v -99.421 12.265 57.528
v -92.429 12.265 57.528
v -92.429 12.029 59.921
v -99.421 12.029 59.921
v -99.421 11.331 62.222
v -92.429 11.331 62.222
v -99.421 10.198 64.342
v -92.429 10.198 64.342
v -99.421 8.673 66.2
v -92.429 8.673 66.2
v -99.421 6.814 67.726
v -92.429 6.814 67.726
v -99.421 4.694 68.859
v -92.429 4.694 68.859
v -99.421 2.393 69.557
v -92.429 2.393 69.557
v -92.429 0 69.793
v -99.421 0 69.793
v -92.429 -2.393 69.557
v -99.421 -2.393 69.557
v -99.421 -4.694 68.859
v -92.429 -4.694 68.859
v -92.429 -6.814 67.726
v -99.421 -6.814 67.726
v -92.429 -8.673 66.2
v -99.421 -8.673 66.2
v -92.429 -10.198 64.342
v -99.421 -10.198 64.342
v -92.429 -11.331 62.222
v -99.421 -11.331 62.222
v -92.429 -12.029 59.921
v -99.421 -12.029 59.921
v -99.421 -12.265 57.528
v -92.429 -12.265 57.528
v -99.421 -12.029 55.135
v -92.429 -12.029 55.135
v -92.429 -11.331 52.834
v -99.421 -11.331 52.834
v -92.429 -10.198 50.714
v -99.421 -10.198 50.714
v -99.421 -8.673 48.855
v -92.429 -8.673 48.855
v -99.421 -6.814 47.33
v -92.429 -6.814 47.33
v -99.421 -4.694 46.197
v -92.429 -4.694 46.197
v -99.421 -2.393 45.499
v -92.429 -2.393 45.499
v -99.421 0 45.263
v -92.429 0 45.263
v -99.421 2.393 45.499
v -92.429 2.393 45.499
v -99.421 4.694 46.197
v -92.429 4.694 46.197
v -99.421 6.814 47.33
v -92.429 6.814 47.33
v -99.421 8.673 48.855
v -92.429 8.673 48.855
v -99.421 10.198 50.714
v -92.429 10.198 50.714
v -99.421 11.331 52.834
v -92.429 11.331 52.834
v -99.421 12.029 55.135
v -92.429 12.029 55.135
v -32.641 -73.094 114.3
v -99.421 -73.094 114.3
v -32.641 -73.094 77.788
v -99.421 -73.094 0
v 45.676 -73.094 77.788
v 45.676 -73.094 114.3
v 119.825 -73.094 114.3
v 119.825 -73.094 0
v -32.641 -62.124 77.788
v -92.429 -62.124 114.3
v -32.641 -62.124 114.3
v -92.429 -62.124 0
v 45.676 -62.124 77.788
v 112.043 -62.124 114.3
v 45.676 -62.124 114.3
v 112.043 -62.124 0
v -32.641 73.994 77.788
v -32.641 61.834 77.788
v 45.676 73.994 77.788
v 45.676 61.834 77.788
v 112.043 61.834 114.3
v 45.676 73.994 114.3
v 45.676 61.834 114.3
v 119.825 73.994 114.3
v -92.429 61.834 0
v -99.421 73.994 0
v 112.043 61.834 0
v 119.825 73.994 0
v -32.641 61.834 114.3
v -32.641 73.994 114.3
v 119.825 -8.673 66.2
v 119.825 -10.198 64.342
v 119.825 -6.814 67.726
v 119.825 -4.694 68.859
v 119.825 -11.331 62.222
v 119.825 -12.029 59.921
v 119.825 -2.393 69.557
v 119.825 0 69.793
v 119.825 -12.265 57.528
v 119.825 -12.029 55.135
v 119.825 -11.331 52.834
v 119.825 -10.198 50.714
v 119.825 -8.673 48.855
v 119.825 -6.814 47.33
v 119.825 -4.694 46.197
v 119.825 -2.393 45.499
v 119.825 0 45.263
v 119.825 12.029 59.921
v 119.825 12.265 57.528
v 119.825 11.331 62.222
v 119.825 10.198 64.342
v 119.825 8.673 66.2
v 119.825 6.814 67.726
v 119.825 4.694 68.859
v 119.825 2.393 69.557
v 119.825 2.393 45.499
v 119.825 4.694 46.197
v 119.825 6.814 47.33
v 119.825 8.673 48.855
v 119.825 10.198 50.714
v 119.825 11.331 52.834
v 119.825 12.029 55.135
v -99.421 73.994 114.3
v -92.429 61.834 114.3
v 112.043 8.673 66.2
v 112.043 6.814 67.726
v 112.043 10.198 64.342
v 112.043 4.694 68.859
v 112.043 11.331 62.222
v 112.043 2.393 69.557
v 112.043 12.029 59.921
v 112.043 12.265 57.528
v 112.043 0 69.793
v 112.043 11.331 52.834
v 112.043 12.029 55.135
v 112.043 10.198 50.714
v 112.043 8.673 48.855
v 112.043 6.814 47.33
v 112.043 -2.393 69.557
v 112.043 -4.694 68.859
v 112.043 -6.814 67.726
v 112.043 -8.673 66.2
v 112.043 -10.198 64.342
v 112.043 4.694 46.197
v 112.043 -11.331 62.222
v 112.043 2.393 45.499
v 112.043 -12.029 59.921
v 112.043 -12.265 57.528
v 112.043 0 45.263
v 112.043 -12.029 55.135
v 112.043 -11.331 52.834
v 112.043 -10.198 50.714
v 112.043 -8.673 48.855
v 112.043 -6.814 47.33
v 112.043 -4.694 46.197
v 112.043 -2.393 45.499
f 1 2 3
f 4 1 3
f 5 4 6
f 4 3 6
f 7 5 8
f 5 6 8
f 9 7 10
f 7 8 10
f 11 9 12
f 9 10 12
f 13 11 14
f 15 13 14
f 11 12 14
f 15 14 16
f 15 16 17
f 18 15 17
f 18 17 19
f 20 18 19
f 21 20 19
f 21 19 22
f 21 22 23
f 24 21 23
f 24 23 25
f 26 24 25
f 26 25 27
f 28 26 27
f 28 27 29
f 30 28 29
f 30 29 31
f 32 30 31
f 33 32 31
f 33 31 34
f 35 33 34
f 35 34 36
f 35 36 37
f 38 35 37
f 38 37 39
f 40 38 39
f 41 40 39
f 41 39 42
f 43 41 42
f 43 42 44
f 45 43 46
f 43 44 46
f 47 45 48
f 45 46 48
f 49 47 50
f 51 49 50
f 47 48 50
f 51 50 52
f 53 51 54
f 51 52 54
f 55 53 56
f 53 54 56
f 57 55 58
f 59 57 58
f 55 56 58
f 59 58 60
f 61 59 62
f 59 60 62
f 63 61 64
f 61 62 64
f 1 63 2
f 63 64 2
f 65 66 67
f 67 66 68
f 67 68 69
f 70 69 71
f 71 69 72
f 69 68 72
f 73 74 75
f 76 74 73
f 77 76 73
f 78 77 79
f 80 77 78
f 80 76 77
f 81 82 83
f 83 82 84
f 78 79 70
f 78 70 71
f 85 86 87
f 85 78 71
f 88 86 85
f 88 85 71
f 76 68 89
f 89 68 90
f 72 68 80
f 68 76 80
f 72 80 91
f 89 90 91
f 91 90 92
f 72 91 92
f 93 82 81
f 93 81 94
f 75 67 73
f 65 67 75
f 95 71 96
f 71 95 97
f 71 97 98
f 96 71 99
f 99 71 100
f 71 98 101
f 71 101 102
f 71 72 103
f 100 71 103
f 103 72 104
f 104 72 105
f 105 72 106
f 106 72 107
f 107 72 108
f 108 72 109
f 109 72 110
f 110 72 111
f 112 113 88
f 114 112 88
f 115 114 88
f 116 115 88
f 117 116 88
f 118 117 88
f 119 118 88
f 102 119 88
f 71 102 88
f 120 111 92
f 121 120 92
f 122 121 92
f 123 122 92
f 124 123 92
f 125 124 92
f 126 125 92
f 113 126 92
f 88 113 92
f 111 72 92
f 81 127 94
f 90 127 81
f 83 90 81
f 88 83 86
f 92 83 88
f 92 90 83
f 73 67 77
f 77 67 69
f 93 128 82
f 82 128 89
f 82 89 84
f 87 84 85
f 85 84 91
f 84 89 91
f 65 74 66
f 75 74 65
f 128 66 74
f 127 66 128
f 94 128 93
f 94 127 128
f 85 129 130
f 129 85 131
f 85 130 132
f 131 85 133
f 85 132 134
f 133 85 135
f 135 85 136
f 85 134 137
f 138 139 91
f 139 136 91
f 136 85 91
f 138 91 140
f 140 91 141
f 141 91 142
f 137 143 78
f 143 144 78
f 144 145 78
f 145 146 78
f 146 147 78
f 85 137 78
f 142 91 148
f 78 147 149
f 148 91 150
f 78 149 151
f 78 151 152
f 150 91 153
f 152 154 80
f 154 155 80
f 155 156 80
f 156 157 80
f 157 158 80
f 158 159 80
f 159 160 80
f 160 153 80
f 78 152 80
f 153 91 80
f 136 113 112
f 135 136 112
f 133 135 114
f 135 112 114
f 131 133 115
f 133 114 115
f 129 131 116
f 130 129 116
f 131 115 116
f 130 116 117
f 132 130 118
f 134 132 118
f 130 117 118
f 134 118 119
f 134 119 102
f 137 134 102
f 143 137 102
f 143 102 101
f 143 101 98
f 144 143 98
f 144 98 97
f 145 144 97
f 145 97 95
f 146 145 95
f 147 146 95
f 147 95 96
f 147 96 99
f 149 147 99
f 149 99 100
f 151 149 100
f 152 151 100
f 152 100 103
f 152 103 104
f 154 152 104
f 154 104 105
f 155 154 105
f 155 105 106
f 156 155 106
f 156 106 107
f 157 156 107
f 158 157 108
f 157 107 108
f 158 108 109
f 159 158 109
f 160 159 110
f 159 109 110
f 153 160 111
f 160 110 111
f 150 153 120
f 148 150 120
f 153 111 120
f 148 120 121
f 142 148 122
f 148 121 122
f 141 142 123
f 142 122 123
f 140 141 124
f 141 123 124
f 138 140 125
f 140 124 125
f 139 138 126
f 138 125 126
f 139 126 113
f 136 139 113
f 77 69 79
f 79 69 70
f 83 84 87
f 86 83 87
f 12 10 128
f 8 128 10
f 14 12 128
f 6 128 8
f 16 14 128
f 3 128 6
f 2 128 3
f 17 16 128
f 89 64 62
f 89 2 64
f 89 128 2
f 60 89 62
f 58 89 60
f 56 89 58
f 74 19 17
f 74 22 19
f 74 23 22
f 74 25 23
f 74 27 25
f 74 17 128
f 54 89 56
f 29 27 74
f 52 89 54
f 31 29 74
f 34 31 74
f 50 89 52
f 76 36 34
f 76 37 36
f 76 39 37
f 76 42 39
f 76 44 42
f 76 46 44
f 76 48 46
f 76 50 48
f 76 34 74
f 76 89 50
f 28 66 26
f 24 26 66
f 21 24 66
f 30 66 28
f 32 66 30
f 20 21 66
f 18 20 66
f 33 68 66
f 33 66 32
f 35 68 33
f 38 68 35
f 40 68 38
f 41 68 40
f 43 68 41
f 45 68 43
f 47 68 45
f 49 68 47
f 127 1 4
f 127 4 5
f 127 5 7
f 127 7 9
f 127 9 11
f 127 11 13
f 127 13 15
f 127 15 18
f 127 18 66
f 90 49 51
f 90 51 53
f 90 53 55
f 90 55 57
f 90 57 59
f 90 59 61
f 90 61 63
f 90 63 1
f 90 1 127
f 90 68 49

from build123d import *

# Parameters (mm, degrees)
F0_W     = 219.245888
F0_H     = 147.08846
F1_DEPTH = 114.3
F2_W     = 78.317389
F2_H     = 36.511922
F3_DEPTH = 147.089461
F4_W     = 204.472921
F4_H     = 123.958089
F5_DEPTH = 114.301
F6_R     = 12.264791
F7_DEPTH = 219.246888


with BuildPart() as f1:
    # F0 (on Top) → F1 (new body)
    with BuildSketch(Plane.XY):
        with Locations((10.201607, 0.449974)):
            Rectangle(F0_W, F0_H)
    extrude(amount=F1_DEPTH)

    # F2 (on face) → F3 (cut, through all)
    with BuildSketch(Plane.XZ.offset(73.094256)):
        with Locations((6.517709, 96.044039)):
            Rectangle(F2_W, F2_H)
    extrude(amount=-F3_DEPTH, mode=Mode.SUBTRACT)

    # F4 (on face) → F5 (cut, through all)
    with BuildSketch(Plane(origin=(0, 0, 0), x_dir=(1, 0, 0), z_dir=(0, 0, -1))):
        with Locations((9.806979, 0.144809)):
            Rectangle(F4_W, F4_H)
    extrude(amount=-F5_DEPTH, mode=Mode.SUBTRACT)

    # F6 (on face) → F7 (cut, through all)
    with BuildSketch(Plane.YZ.offset(119.824551)):
        with Locations((0, 57.527971)):
            Circle(F6_R)
    extrude(amount=-F7_DEPTH, mode=Mode.SUBTRACT)


solid = f1.part
